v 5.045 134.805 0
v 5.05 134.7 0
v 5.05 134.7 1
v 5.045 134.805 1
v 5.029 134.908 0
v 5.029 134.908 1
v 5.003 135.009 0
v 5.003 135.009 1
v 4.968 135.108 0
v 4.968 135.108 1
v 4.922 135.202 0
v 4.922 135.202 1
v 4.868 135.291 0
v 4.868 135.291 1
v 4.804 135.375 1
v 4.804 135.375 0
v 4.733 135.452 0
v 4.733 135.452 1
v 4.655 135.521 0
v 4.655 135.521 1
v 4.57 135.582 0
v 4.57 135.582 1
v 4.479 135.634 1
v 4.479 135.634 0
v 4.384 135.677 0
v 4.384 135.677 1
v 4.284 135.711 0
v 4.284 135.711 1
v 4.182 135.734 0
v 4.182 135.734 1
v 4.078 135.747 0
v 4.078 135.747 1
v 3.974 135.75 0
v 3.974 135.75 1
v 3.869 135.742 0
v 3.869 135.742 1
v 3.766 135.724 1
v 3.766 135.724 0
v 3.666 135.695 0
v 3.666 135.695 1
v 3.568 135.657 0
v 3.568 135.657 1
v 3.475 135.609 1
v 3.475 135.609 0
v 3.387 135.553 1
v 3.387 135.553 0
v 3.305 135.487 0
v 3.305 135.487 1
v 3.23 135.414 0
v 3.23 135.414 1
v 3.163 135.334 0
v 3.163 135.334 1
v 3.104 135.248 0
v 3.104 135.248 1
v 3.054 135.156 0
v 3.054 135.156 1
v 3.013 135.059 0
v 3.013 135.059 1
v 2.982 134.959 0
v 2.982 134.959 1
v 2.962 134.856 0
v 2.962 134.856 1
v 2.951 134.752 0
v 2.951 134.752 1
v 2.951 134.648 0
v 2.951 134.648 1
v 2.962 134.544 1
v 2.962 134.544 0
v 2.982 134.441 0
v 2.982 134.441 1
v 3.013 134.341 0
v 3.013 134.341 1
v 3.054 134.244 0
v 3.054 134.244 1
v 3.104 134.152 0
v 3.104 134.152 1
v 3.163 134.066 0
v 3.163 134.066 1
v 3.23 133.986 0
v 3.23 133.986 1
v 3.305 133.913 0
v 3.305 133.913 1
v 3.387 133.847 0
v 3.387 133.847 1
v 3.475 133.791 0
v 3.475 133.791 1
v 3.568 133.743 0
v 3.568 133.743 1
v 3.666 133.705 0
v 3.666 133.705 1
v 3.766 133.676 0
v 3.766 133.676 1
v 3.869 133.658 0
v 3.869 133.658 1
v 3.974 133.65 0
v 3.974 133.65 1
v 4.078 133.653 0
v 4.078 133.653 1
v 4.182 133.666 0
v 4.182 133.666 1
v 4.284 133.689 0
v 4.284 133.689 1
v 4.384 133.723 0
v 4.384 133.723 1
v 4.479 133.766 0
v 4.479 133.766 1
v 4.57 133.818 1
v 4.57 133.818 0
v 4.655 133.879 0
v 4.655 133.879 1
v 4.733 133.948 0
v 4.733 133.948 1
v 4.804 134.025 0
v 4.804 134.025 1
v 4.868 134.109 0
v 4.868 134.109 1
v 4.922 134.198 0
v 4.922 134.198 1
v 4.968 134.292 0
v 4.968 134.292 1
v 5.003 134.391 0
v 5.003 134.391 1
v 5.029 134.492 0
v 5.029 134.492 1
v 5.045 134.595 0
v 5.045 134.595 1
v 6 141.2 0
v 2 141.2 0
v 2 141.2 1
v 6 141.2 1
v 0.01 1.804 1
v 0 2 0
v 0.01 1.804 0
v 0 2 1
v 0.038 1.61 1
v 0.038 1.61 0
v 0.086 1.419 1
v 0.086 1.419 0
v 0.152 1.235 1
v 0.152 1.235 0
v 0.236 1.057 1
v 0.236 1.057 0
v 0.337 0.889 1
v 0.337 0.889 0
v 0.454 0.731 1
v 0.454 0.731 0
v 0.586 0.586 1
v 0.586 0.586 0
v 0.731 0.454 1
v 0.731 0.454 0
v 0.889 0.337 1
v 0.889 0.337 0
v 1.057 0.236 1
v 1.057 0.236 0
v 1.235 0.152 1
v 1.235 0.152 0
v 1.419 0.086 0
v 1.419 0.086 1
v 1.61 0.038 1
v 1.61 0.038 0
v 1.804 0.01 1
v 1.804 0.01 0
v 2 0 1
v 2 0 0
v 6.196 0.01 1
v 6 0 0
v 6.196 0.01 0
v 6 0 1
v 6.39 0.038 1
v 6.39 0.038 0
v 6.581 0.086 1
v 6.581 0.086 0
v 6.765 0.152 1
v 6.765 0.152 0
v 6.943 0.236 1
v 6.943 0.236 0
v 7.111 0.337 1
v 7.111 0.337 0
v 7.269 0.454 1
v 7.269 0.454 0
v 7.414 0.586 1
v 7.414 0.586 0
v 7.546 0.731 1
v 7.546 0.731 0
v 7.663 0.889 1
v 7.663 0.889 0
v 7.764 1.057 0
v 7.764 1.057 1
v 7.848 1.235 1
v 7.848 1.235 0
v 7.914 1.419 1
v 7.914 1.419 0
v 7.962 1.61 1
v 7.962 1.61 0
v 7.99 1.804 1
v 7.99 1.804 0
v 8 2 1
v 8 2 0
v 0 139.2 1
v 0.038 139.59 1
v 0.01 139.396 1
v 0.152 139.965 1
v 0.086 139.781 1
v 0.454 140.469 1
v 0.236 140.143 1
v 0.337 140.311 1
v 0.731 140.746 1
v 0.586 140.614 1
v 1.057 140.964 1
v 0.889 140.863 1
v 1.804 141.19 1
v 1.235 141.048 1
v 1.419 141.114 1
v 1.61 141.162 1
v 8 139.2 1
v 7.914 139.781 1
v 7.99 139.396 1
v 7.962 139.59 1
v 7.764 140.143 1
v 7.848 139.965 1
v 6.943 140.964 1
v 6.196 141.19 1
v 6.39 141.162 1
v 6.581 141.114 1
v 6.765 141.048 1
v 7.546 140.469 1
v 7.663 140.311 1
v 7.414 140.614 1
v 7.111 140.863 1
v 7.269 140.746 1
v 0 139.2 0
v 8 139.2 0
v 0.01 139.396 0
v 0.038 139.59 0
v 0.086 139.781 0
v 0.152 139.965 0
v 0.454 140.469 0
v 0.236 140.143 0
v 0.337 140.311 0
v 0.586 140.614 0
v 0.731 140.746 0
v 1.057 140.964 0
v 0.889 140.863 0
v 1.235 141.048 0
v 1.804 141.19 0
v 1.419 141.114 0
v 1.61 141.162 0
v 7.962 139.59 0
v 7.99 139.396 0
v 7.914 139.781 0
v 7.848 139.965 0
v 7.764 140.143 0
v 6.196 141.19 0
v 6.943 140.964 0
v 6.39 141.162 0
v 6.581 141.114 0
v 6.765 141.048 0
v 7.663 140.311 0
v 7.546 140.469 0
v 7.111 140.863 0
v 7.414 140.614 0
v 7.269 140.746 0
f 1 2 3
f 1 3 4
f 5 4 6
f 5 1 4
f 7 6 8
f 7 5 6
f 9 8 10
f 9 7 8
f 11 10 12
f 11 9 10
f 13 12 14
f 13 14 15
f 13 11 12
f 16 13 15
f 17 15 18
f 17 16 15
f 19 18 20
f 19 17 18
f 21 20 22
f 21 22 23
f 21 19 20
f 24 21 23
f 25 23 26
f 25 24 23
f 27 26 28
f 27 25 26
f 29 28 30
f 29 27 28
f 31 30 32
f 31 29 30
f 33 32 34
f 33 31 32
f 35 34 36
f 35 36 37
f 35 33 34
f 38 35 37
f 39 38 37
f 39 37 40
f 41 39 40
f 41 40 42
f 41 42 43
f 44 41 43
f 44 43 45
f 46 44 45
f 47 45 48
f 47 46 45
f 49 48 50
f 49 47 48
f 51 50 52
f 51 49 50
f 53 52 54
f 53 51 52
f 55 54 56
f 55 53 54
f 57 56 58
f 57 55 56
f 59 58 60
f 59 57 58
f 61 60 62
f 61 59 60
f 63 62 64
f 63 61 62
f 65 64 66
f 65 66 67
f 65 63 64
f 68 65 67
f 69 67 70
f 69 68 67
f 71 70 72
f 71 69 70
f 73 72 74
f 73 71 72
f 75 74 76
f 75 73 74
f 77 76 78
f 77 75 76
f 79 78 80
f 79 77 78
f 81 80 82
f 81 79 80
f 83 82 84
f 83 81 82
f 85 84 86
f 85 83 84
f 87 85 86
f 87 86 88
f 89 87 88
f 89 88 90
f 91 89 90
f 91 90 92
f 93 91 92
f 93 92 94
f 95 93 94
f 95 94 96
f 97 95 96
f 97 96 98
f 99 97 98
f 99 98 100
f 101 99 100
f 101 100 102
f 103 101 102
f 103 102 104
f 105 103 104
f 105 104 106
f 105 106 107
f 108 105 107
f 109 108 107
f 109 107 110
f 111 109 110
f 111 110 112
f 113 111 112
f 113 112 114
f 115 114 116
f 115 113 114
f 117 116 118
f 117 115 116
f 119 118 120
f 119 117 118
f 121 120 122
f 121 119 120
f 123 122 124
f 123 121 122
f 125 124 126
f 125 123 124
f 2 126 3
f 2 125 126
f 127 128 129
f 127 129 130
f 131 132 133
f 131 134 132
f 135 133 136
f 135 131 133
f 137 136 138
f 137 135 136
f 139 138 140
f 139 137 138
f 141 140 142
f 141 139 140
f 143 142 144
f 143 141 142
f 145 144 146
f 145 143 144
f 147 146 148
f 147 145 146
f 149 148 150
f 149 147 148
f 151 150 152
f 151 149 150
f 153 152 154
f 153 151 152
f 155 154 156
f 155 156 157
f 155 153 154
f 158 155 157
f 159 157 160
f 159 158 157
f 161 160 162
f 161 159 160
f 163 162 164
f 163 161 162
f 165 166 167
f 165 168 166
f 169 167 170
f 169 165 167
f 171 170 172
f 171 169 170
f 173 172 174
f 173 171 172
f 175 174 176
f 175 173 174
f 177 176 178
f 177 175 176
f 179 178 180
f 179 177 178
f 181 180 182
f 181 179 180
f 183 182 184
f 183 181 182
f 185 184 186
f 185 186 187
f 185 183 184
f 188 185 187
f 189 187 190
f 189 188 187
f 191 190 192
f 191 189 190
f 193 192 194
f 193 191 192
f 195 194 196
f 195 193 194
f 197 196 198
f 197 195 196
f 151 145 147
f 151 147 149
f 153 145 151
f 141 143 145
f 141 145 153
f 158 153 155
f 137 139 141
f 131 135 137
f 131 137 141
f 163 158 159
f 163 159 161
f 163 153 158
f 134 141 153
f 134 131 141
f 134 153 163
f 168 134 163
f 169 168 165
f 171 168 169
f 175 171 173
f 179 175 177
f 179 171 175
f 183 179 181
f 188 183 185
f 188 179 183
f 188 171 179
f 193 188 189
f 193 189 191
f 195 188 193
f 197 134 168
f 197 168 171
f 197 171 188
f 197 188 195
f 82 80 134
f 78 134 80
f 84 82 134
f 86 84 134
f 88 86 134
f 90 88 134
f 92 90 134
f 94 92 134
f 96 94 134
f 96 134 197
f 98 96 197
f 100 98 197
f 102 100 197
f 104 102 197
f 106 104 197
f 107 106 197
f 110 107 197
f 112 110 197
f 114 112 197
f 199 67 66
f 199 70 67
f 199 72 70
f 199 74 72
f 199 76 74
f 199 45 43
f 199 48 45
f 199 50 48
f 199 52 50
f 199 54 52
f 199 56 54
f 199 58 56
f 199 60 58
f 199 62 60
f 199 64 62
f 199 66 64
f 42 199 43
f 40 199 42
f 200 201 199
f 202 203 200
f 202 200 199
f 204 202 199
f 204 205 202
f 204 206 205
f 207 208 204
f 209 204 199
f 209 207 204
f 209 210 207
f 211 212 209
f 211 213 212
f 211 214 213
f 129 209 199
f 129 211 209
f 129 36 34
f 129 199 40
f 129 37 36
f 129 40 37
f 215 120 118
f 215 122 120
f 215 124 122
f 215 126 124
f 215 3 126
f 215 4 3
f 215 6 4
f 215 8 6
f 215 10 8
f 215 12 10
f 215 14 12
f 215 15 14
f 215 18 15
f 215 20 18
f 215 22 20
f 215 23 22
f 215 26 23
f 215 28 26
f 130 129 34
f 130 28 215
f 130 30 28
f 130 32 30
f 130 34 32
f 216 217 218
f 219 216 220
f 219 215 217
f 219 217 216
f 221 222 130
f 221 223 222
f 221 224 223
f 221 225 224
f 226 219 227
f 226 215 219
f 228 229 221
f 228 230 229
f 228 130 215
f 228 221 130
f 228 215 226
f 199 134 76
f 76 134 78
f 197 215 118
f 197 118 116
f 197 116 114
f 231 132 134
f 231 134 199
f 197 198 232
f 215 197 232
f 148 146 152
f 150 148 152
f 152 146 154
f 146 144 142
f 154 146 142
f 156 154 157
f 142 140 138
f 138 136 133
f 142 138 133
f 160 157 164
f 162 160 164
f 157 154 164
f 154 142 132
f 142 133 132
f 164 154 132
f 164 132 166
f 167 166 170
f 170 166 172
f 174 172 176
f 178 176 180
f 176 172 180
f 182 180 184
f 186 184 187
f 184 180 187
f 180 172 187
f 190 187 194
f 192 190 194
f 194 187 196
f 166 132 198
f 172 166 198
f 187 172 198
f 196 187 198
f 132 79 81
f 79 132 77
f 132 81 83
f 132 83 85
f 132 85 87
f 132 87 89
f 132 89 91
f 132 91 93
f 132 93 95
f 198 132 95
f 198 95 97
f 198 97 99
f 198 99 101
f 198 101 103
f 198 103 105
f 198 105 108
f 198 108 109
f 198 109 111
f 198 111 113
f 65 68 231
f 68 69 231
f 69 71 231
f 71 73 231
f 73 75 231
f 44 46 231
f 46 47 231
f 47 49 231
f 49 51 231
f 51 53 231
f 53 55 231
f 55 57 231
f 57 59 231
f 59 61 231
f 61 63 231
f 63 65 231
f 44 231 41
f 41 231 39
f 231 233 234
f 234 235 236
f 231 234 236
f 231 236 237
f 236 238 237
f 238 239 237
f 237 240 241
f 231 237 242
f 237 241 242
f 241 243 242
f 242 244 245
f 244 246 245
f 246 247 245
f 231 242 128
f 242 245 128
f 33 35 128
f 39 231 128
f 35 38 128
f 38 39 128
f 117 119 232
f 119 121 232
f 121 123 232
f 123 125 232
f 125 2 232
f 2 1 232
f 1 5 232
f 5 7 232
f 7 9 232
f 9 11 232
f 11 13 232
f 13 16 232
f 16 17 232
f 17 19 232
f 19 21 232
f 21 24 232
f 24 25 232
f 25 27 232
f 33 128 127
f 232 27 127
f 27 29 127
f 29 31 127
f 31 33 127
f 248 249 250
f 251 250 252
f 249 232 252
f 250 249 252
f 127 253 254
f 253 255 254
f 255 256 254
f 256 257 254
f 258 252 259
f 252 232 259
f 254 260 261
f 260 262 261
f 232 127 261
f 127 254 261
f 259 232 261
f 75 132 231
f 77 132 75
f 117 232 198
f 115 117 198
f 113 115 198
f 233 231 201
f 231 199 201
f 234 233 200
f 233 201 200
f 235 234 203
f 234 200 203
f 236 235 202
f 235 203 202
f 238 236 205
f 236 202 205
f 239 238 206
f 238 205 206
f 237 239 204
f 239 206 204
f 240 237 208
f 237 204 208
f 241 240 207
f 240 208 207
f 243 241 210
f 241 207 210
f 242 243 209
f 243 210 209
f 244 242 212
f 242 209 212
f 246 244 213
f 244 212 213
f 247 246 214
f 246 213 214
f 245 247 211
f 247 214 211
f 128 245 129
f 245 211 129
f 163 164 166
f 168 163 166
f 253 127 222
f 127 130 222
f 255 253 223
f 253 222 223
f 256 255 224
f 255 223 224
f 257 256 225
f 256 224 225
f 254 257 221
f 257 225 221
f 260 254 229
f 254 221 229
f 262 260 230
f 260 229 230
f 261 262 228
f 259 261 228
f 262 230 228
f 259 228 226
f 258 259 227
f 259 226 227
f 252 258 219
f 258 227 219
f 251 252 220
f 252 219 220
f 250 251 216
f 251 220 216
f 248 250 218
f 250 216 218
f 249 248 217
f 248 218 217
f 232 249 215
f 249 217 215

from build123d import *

# Parameters (mm, degrees)
SKETCH2_W           = 8
SKETCH2_H           = 141.2
SKETCH2_R           = 1.05
BOSS_EXTRUDE1_DEPTH = 1
FILLET1_R           = 2


with BuildPart() as part:
    # Sketch2 → Boss-Extrude1 (new body)
    with BuildSketch(Plane.XY):
        with Locations((4, 70.6)):
            Rectangle(SKETCH2_W, SKETCH2_H)
        with Locations((4, 134.7)):
            Circle(SKETCH2_R, mode=Mode.SUBTRACT)
    extrude(amount=BOSS_EXTRUDE1_DEPTH)

    # Fillet1
    fillet1_edges = [part.edges().sort_by_distance(p)[0] for p in [
        (0, 141.2, 0.5),
        (8, 141.2, 0.5),
        (8, 0, 0.5),
        (0, 0, 0.5),
    ]]
    fillet(fillet1_edges, radius=FILLET1_R)


solid = part.part
